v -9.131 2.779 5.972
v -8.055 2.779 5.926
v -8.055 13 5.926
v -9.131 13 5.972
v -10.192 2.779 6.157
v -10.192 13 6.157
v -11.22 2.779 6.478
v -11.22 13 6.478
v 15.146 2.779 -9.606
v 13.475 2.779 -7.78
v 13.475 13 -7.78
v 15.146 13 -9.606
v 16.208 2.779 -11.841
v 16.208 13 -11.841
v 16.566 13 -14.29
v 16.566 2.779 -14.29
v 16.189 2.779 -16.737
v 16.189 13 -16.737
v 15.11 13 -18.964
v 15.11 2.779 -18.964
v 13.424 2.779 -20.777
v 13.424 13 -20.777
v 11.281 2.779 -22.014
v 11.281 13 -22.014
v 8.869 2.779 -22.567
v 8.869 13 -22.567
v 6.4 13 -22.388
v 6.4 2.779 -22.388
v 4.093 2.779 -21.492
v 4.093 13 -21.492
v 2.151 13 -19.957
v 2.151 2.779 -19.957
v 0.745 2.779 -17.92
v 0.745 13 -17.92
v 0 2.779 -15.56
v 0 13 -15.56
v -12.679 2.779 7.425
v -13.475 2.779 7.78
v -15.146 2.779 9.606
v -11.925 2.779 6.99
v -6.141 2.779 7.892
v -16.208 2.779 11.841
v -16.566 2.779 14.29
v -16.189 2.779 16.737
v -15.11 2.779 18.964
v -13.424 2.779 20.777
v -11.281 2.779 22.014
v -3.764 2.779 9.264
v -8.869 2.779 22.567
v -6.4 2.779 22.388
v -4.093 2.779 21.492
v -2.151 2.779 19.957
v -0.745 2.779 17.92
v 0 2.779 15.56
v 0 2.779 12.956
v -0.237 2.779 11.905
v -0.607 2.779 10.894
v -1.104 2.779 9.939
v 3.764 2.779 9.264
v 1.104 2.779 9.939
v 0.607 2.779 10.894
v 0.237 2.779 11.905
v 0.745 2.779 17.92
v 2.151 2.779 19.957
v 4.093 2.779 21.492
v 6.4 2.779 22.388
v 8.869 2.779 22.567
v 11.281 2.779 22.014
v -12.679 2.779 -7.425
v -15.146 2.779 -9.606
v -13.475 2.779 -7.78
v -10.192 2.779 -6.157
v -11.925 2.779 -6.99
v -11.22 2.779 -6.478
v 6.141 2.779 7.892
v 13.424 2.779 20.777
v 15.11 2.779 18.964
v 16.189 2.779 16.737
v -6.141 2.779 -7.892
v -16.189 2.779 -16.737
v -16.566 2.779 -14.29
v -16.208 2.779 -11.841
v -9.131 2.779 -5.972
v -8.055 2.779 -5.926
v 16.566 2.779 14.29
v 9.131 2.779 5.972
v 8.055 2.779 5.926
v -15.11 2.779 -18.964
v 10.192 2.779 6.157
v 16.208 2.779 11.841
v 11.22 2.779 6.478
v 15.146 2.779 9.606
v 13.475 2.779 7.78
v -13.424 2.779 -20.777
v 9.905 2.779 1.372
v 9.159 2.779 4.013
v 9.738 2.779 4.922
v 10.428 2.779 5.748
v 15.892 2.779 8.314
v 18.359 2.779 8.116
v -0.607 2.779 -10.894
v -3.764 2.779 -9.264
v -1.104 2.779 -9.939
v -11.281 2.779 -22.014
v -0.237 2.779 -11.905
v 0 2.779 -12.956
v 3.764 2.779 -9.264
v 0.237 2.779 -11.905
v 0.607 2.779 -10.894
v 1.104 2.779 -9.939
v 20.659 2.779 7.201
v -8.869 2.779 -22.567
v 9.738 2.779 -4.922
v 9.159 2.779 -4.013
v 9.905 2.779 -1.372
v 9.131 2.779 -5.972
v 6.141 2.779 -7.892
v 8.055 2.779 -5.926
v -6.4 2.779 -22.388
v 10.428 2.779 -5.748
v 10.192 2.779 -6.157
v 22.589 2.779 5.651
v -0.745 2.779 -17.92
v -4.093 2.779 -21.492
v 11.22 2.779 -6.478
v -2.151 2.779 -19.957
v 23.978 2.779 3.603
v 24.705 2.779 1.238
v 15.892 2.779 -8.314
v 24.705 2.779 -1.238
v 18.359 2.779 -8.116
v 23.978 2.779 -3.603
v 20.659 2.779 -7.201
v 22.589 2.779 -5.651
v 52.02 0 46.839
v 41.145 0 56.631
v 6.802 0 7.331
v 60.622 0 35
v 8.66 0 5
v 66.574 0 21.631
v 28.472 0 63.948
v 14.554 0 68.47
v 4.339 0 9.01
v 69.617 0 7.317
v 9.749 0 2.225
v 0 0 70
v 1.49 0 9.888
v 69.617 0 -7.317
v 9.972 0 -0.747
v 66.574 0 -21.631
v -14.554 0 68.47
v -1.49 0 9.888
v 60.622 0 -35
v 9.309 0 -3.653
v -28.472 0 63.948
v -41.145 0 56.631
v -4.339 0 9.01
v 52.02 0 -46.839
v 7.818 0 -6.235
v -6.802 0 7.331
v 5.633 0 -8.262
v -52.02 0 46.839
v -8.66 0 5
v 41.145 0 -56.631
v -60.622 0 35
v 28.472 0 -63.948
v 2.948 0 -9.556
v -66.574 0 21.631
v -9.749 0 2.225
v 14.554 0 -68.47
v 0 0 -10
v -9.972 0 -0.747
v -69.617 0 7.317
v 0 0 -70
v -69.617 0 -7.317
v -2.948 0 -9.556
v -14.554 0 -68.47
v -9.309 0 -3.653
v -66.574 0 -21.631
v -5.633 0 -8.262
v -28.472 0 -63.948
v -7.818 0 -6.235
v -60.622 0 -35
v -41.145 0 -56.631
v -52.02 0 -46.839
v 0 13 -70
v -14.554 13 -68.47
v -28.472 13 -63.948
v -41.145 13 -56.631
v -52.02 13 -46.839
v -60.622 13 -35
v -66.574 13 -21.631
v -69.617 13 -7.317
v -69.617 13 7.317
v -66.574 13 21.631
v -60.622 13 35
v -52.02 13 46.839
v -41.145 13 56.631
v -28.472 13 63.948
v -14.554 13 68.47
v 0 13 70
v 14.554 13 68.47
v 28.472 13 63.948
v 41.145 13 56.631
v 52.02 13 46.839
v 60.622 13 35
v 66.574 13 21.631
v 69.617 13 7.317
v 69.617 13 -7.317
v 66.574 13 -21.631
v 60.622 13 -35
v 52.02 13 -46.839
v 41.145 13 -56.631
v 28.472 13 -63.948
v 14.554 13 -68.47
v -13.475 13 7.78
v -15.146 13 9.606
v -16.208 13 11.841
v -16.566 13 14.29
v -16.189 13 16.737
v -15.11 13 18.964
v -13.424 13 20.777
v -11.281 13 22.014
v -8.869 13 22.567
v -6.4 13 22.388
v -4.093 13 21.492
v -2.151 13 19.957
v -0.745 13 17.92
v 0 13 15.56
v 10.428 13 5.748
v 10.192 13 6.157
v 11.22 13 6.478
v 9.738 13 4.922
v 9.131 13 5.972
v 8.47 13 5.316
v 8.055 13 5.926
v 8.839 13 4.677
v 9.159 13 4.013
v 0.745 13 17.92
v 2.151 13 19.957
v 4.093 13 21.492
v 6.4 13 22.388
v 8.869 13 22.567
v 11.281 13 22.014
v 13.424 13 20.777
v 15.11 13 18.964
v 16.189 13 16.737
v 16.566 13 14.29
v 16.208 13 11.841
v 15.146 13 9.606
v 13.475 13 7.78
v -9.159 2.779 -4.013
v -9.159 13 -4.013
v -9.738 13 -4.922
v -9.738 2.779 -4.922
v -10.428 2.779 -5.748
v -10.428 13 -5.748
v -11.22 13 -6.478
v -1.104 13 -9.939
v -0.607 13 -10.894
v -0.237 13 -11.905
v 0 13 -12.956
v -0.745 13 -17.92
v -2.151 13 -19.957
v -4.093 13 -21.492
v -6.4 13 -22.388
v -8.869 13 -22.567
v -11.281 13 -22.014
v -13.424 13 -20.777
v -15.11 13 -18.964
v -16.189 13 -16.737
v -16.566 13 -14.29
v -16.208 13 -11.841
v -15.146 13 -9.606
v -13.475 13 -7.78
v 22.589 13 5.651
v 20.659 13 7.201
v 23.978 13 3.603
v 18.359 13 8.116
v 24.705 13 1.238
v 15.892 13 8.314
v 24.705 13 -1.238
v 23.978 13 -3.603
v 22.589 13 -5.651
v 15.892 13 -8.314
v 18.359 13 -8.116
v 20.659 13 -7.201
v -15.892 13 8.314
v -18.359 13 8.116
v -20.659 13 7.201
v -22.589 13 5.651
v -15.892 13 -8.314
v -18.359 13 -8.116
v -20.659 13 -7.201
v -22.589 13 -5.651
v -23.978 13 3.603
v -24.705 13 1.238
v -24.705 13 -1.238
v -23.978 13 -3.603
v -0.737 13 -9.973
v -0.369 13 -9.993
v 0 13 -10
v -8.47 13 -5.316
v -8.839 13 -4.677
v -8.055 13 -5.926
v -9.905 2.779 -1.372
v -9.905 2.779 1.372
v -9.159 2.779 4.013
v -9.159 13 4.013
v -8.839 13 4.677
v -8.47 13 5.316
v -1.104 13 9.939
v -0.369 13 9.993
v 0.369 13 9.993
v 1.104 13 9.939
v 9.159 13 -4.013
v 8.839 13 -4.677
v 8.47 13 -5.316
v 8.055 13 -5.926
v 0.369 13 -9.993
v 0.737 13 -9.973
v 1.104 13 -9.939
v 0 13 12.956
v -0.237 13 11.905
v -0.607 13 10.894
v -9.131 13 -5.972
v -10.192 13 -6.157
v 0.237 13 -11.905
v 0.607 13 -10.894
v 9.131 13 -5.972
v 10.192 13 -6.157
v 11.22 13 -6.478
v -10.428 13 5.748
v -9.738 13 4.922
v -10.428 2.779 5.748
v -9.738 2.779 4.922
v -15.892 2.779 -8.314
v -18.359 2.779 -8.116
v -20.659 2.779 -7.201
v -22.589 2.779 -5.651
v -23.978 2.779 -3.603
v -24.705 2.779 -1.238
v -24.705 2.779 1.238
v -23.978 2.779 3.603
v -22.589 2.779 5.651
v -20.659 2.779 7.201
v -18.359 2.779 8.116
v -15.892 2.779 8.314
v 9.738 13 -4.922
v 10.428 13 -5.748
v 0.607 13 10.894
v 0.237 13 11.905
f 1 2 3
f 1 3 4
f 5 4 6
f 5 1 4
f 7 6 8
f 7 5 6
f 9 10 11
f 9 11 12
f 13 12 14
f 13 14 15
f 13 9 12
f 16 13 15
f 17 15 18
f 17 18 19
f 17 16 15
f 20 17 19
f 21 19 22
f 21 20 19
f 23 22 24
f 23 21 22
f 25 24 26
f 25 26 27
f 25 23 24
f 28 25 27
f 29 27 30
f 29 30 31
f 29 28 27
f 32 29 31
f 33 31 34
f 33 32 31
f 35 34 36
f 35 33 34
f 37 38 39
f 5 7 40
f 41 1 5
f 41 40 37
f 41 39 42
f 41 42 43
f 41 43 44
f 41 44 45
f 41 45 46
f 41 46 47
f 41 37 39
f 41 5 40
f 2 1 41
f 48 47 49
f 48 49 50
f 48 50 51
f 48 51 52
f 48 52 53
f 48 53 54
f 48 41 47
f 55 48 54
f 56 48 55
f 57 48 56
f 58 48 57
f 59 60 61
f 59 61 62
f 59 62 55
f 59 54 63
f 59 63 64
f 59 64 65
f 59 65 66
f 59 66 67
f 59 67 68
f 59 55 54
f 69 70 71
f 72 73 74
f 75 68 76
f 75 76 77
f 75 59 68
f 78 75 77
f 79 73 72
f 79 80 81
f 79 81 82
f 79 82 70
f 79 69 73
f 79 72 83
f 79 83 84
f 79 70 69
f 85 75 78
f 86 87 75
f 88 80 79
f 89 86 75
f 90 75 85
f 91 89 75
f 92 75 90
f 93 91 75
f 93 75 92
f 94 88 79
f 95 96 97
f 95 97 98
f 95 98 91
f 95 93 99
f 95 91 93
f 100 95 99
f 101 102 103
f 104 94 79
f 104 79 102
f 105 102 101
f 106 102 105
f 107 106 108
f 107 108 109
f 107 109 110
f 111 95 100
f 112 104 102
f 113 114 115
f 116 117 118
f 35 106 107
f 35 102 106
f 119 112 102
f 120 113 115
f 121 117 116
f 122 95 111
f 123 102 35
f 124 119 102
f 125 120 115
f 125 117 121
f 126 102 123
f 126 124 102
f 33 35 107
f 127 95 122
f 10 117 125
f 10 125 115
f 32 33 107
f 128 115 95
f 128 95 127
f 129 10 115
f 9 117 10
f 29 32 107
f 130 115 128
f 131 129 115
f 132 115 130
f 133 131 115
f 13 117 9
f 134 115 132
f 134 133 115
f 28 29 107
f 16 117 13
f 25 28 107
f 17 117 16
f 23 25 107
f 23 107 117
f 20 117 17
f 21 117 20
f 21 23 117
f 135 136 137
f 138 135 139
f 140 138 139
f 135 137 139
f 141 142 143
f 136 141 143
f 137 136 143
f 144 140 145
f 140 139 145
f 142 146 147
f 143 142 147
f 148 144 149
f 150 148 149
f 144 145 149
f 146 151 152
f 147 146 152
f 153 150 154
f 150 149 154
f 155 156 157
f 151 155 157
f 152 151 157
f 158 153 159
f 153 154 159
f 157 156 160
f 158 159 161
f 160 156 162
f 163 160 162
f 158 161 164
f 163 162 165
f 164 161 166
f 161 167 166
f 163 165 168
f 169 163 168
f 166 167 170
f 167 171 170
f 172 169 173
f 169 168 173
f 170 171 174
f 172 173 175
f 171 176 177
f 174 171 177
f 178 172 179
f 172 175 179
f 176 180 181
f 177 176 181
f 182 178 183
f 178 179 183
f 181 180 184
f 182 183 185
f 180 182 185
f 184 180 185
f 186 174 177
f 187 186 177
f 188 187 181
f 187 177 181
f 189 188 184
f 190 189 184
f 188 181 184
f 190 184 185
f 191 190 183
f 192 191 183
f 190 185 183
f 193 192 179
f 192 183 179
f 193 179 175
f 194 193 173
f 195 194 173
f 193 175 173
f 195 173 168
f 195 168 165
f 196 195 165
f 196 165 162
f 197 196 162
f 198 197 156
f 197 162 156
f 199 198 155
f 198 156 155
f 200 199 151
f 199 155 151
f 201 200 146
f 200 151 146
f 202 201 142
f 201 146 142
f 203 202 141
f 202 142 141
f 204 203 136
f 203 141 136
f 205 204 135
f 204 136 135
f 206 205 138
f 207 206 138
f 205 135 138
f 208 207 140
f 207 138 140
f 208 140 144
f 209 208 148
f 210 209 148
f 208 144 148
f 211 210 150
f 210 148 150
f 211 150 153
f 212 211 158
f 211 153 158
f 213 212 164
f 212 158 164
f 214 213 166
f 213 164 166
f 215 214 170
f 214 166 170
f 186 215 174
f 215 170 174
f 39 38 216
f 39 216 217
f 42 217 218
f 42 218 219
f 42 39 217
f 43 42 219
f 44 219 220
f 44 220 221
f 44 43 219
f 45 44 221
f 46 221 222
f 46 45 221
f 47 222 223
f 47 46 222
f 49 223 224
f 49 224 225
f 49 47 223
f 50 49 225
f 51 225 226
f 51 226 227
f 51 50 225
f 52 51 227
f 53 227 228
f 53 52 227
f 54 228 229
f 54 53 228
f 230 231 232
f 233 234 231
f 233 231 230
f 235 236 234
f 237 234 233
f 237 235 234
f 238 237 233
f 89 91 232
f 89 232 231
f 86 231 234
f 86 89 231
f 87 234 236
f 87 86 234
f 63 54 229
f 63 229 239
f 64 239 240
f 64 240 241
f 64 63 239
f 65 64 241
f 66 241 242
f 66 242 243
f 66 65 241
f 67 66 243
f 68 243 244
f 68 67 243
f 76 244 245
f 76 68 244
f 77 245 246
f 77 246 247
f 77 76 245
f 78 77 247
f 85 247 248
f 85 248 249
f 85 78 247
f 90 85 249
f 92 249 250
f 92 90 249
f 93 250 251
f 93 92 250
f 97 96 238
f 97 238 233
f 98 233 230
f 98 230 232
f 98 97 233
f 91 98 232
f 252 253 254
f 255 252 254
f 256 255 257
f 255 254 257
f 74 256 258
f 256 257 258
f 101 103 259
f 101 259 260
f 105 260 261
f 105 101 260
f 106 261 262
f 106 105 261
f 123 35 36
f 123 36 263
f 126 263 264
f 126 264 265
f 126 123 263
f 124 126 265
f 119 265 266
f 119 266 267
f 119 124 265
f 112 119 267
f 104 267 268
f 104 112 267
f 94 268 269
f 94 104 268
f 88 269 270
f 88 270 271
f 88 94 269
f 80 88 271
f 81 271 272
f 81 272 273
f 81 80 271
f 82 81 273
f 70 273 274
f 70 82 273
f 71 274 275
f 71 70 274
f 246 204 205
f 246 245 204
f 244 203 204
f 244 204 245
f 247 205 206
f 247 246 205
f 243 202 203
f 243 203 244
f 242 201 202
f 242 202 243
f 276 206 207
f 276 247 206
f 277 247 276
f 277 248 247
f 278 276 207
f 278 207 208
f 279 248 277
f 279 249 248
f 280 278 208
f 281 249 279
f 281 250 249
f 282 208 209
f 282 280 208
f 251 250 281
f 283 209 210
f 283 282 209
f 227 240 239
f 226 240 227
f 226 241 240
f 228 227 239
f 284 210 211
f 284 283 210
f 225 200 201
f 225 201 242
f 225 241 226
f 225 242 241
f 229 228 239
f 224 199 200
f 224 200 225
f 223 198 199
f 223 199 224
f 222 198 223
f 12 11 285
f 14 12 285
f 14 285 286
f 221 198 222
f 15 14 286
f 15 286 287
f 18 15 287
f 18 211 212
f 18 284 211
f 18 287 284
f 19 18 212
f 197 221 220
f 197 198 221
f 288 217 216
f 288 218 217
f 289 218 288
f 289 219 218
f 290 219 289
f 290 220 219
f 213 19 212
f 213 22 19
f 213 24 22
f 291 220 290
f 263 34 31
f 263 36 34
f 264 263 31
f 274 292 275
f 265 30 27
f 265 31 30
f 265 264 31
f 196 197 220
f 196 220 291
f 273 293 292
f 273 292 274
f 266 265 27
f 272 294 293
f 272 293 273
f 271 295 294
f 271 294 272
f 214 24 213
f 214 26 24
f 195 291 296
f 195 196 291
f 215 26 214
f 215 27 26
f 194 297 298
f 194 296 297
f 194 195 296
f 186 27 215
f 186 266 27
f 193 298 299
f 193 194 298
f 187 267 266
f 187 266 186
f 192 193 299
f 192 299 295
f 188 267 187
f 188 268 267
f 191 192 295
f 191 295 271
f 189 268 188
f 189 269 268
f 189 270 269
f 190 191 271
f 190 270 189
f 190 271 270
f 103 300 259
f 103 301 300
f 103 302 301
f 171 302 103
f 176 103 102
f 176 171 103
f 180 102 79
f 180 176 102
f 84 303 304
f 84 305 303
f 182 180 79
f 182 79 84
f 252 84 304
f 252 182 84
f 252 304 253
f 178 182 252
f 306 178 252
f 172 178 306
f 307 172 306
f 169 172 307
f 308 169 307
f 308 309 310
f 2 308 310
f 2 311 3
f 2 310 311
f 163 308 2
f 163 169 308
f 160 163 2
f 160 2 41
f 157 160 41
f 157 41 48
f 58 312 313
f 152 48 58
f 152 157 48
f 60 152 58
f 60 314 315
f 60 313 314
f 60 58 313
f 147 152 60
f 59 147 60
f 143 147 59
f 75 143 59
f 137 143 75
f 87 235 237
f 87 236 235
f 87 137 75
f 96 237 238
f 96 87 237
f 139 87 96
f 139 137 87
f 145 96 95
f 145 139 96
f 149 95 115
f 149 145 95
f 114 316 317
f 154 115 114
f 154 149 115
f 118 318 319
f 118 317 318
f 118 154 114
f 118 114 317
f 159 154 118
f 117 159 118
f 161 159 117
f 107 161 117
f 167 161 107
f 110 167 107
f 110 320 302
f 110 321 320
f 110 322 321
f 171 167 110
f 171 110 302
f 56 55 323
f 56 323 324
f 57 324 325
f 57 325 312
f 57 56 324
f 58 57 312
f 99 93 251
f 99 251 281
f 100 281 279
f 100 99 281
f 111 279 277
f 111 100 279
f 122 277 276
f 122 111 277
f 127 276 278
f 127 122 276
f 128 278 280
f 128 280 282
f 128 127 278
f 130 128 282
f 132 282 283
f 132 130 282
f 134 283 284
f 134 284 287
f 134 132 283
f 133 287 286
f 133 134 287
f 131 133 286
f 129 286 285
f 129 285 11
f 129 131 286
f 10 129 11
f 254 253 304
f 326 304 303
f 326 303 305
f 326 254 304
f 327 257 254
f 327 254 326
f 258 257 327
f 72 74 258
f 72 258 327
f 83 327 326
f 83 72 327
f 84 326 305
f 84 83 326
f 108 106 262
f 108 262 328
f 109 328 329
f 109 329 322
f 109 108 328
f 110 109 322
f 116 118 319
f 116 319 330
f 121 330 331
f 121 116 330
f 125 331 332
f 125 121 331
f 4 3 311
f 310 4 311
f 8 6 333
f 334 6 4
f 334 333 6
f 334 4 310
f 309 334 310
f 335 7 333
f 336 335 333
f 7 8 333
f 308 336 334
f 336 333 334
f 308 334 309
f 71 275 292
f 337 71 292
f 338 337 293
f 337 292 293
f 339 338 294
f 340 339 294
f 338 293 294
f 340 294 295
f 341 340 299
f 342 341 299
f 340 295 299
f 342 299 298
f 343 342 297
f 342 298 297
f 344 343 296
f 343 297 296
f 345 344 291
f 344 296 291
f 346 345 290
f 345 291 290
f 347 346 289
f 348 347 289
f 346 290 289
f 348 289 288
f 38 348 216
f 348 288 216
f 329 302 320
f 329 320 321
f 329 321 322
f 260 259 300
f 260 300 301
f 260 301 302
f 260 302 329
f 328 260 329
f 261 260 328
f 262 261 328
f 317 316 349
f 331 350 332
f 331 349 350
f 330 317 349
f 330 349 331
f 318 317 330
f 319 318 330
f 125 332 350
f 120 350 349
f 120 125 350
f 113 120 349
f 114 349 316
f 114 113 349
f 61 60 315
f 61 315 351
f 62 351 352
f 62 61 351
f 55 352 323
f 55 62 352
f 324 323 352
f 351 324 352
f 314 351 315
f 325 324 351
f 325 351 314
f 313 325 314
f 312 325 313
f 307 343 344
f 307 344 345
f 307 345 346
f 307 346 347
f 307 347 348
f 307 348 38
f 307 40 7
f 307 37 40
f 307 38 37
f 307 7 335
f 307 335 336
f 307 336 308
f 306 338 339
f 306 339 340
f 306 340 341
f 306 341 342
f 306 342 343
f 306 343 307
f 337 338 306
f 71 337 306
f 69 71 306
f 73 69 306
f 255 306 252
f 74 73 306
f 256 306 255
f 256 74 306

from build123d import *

# Parameters (mm, degrees)
SKETCH1_R           = 70
BOSS_EXTRUDE1_DEPTH = 13
SKETCH2_R           = 10
CUT_EXTRUDE1_DEPTH  = 100.844879688
SKETCH3_R           = 8.334076576
CUT_EXTRUDE2_DEPTH  = 10.220804832
CIRPATTERN1_COUNT   = 6


with BuildPart() as part:
    # Sketch1 → Boss-Extrude1 (new body)
    with BuildSketch(Plane(origin=(0, 0, 0), x_dir=(1, 0, 0), z_dir=(0, 1, 0))):
        Circle(SKETCH1_R)
    extrude(amount=BOSS_EXTRUDE1_DEPTH)

    # Sketch2 → Cut-Extrude1 (cut, through all)
    with BuildSketch(Plane(origin=(0, 0, 0), x_dir=(1, 0, 0), z_dir=(0, 1, 0))):
        Circle(SKETCH2_R)
    extrude(amount=CUT_EXTRUDE1_DEPTH, mode=Mode.SUBTRACT)

    # Sketch3 → Cut-Extrude2 (cut)
    with BuildSketch(Plane(origin=(0, 13, 0), x_dir=(1, 0, 0), z_dir=(0, 1, 0))):
        with Locations((-16.463436294, 0)):
            Circle(SKETCH3_R)
    cut_extrude2 = extrude(amount=-CUT_EXTRUDE2_DEPTH, mode=Mode.SUBTRACT)

    # CirPattern1: Cut-Extrude2 ×6 about axis
    cirpattern1_axis = Axis((0, 0, 0), (0, 1, 0))
    for i in range(1, CIRPATTERN1_COUNT):
        add(cut_extrude2.rotate(cirpattern1_axis, i * 360 / CIRPATTERN1_COUNT), mode=Mode.SUBTRACT)


solid = part.part
